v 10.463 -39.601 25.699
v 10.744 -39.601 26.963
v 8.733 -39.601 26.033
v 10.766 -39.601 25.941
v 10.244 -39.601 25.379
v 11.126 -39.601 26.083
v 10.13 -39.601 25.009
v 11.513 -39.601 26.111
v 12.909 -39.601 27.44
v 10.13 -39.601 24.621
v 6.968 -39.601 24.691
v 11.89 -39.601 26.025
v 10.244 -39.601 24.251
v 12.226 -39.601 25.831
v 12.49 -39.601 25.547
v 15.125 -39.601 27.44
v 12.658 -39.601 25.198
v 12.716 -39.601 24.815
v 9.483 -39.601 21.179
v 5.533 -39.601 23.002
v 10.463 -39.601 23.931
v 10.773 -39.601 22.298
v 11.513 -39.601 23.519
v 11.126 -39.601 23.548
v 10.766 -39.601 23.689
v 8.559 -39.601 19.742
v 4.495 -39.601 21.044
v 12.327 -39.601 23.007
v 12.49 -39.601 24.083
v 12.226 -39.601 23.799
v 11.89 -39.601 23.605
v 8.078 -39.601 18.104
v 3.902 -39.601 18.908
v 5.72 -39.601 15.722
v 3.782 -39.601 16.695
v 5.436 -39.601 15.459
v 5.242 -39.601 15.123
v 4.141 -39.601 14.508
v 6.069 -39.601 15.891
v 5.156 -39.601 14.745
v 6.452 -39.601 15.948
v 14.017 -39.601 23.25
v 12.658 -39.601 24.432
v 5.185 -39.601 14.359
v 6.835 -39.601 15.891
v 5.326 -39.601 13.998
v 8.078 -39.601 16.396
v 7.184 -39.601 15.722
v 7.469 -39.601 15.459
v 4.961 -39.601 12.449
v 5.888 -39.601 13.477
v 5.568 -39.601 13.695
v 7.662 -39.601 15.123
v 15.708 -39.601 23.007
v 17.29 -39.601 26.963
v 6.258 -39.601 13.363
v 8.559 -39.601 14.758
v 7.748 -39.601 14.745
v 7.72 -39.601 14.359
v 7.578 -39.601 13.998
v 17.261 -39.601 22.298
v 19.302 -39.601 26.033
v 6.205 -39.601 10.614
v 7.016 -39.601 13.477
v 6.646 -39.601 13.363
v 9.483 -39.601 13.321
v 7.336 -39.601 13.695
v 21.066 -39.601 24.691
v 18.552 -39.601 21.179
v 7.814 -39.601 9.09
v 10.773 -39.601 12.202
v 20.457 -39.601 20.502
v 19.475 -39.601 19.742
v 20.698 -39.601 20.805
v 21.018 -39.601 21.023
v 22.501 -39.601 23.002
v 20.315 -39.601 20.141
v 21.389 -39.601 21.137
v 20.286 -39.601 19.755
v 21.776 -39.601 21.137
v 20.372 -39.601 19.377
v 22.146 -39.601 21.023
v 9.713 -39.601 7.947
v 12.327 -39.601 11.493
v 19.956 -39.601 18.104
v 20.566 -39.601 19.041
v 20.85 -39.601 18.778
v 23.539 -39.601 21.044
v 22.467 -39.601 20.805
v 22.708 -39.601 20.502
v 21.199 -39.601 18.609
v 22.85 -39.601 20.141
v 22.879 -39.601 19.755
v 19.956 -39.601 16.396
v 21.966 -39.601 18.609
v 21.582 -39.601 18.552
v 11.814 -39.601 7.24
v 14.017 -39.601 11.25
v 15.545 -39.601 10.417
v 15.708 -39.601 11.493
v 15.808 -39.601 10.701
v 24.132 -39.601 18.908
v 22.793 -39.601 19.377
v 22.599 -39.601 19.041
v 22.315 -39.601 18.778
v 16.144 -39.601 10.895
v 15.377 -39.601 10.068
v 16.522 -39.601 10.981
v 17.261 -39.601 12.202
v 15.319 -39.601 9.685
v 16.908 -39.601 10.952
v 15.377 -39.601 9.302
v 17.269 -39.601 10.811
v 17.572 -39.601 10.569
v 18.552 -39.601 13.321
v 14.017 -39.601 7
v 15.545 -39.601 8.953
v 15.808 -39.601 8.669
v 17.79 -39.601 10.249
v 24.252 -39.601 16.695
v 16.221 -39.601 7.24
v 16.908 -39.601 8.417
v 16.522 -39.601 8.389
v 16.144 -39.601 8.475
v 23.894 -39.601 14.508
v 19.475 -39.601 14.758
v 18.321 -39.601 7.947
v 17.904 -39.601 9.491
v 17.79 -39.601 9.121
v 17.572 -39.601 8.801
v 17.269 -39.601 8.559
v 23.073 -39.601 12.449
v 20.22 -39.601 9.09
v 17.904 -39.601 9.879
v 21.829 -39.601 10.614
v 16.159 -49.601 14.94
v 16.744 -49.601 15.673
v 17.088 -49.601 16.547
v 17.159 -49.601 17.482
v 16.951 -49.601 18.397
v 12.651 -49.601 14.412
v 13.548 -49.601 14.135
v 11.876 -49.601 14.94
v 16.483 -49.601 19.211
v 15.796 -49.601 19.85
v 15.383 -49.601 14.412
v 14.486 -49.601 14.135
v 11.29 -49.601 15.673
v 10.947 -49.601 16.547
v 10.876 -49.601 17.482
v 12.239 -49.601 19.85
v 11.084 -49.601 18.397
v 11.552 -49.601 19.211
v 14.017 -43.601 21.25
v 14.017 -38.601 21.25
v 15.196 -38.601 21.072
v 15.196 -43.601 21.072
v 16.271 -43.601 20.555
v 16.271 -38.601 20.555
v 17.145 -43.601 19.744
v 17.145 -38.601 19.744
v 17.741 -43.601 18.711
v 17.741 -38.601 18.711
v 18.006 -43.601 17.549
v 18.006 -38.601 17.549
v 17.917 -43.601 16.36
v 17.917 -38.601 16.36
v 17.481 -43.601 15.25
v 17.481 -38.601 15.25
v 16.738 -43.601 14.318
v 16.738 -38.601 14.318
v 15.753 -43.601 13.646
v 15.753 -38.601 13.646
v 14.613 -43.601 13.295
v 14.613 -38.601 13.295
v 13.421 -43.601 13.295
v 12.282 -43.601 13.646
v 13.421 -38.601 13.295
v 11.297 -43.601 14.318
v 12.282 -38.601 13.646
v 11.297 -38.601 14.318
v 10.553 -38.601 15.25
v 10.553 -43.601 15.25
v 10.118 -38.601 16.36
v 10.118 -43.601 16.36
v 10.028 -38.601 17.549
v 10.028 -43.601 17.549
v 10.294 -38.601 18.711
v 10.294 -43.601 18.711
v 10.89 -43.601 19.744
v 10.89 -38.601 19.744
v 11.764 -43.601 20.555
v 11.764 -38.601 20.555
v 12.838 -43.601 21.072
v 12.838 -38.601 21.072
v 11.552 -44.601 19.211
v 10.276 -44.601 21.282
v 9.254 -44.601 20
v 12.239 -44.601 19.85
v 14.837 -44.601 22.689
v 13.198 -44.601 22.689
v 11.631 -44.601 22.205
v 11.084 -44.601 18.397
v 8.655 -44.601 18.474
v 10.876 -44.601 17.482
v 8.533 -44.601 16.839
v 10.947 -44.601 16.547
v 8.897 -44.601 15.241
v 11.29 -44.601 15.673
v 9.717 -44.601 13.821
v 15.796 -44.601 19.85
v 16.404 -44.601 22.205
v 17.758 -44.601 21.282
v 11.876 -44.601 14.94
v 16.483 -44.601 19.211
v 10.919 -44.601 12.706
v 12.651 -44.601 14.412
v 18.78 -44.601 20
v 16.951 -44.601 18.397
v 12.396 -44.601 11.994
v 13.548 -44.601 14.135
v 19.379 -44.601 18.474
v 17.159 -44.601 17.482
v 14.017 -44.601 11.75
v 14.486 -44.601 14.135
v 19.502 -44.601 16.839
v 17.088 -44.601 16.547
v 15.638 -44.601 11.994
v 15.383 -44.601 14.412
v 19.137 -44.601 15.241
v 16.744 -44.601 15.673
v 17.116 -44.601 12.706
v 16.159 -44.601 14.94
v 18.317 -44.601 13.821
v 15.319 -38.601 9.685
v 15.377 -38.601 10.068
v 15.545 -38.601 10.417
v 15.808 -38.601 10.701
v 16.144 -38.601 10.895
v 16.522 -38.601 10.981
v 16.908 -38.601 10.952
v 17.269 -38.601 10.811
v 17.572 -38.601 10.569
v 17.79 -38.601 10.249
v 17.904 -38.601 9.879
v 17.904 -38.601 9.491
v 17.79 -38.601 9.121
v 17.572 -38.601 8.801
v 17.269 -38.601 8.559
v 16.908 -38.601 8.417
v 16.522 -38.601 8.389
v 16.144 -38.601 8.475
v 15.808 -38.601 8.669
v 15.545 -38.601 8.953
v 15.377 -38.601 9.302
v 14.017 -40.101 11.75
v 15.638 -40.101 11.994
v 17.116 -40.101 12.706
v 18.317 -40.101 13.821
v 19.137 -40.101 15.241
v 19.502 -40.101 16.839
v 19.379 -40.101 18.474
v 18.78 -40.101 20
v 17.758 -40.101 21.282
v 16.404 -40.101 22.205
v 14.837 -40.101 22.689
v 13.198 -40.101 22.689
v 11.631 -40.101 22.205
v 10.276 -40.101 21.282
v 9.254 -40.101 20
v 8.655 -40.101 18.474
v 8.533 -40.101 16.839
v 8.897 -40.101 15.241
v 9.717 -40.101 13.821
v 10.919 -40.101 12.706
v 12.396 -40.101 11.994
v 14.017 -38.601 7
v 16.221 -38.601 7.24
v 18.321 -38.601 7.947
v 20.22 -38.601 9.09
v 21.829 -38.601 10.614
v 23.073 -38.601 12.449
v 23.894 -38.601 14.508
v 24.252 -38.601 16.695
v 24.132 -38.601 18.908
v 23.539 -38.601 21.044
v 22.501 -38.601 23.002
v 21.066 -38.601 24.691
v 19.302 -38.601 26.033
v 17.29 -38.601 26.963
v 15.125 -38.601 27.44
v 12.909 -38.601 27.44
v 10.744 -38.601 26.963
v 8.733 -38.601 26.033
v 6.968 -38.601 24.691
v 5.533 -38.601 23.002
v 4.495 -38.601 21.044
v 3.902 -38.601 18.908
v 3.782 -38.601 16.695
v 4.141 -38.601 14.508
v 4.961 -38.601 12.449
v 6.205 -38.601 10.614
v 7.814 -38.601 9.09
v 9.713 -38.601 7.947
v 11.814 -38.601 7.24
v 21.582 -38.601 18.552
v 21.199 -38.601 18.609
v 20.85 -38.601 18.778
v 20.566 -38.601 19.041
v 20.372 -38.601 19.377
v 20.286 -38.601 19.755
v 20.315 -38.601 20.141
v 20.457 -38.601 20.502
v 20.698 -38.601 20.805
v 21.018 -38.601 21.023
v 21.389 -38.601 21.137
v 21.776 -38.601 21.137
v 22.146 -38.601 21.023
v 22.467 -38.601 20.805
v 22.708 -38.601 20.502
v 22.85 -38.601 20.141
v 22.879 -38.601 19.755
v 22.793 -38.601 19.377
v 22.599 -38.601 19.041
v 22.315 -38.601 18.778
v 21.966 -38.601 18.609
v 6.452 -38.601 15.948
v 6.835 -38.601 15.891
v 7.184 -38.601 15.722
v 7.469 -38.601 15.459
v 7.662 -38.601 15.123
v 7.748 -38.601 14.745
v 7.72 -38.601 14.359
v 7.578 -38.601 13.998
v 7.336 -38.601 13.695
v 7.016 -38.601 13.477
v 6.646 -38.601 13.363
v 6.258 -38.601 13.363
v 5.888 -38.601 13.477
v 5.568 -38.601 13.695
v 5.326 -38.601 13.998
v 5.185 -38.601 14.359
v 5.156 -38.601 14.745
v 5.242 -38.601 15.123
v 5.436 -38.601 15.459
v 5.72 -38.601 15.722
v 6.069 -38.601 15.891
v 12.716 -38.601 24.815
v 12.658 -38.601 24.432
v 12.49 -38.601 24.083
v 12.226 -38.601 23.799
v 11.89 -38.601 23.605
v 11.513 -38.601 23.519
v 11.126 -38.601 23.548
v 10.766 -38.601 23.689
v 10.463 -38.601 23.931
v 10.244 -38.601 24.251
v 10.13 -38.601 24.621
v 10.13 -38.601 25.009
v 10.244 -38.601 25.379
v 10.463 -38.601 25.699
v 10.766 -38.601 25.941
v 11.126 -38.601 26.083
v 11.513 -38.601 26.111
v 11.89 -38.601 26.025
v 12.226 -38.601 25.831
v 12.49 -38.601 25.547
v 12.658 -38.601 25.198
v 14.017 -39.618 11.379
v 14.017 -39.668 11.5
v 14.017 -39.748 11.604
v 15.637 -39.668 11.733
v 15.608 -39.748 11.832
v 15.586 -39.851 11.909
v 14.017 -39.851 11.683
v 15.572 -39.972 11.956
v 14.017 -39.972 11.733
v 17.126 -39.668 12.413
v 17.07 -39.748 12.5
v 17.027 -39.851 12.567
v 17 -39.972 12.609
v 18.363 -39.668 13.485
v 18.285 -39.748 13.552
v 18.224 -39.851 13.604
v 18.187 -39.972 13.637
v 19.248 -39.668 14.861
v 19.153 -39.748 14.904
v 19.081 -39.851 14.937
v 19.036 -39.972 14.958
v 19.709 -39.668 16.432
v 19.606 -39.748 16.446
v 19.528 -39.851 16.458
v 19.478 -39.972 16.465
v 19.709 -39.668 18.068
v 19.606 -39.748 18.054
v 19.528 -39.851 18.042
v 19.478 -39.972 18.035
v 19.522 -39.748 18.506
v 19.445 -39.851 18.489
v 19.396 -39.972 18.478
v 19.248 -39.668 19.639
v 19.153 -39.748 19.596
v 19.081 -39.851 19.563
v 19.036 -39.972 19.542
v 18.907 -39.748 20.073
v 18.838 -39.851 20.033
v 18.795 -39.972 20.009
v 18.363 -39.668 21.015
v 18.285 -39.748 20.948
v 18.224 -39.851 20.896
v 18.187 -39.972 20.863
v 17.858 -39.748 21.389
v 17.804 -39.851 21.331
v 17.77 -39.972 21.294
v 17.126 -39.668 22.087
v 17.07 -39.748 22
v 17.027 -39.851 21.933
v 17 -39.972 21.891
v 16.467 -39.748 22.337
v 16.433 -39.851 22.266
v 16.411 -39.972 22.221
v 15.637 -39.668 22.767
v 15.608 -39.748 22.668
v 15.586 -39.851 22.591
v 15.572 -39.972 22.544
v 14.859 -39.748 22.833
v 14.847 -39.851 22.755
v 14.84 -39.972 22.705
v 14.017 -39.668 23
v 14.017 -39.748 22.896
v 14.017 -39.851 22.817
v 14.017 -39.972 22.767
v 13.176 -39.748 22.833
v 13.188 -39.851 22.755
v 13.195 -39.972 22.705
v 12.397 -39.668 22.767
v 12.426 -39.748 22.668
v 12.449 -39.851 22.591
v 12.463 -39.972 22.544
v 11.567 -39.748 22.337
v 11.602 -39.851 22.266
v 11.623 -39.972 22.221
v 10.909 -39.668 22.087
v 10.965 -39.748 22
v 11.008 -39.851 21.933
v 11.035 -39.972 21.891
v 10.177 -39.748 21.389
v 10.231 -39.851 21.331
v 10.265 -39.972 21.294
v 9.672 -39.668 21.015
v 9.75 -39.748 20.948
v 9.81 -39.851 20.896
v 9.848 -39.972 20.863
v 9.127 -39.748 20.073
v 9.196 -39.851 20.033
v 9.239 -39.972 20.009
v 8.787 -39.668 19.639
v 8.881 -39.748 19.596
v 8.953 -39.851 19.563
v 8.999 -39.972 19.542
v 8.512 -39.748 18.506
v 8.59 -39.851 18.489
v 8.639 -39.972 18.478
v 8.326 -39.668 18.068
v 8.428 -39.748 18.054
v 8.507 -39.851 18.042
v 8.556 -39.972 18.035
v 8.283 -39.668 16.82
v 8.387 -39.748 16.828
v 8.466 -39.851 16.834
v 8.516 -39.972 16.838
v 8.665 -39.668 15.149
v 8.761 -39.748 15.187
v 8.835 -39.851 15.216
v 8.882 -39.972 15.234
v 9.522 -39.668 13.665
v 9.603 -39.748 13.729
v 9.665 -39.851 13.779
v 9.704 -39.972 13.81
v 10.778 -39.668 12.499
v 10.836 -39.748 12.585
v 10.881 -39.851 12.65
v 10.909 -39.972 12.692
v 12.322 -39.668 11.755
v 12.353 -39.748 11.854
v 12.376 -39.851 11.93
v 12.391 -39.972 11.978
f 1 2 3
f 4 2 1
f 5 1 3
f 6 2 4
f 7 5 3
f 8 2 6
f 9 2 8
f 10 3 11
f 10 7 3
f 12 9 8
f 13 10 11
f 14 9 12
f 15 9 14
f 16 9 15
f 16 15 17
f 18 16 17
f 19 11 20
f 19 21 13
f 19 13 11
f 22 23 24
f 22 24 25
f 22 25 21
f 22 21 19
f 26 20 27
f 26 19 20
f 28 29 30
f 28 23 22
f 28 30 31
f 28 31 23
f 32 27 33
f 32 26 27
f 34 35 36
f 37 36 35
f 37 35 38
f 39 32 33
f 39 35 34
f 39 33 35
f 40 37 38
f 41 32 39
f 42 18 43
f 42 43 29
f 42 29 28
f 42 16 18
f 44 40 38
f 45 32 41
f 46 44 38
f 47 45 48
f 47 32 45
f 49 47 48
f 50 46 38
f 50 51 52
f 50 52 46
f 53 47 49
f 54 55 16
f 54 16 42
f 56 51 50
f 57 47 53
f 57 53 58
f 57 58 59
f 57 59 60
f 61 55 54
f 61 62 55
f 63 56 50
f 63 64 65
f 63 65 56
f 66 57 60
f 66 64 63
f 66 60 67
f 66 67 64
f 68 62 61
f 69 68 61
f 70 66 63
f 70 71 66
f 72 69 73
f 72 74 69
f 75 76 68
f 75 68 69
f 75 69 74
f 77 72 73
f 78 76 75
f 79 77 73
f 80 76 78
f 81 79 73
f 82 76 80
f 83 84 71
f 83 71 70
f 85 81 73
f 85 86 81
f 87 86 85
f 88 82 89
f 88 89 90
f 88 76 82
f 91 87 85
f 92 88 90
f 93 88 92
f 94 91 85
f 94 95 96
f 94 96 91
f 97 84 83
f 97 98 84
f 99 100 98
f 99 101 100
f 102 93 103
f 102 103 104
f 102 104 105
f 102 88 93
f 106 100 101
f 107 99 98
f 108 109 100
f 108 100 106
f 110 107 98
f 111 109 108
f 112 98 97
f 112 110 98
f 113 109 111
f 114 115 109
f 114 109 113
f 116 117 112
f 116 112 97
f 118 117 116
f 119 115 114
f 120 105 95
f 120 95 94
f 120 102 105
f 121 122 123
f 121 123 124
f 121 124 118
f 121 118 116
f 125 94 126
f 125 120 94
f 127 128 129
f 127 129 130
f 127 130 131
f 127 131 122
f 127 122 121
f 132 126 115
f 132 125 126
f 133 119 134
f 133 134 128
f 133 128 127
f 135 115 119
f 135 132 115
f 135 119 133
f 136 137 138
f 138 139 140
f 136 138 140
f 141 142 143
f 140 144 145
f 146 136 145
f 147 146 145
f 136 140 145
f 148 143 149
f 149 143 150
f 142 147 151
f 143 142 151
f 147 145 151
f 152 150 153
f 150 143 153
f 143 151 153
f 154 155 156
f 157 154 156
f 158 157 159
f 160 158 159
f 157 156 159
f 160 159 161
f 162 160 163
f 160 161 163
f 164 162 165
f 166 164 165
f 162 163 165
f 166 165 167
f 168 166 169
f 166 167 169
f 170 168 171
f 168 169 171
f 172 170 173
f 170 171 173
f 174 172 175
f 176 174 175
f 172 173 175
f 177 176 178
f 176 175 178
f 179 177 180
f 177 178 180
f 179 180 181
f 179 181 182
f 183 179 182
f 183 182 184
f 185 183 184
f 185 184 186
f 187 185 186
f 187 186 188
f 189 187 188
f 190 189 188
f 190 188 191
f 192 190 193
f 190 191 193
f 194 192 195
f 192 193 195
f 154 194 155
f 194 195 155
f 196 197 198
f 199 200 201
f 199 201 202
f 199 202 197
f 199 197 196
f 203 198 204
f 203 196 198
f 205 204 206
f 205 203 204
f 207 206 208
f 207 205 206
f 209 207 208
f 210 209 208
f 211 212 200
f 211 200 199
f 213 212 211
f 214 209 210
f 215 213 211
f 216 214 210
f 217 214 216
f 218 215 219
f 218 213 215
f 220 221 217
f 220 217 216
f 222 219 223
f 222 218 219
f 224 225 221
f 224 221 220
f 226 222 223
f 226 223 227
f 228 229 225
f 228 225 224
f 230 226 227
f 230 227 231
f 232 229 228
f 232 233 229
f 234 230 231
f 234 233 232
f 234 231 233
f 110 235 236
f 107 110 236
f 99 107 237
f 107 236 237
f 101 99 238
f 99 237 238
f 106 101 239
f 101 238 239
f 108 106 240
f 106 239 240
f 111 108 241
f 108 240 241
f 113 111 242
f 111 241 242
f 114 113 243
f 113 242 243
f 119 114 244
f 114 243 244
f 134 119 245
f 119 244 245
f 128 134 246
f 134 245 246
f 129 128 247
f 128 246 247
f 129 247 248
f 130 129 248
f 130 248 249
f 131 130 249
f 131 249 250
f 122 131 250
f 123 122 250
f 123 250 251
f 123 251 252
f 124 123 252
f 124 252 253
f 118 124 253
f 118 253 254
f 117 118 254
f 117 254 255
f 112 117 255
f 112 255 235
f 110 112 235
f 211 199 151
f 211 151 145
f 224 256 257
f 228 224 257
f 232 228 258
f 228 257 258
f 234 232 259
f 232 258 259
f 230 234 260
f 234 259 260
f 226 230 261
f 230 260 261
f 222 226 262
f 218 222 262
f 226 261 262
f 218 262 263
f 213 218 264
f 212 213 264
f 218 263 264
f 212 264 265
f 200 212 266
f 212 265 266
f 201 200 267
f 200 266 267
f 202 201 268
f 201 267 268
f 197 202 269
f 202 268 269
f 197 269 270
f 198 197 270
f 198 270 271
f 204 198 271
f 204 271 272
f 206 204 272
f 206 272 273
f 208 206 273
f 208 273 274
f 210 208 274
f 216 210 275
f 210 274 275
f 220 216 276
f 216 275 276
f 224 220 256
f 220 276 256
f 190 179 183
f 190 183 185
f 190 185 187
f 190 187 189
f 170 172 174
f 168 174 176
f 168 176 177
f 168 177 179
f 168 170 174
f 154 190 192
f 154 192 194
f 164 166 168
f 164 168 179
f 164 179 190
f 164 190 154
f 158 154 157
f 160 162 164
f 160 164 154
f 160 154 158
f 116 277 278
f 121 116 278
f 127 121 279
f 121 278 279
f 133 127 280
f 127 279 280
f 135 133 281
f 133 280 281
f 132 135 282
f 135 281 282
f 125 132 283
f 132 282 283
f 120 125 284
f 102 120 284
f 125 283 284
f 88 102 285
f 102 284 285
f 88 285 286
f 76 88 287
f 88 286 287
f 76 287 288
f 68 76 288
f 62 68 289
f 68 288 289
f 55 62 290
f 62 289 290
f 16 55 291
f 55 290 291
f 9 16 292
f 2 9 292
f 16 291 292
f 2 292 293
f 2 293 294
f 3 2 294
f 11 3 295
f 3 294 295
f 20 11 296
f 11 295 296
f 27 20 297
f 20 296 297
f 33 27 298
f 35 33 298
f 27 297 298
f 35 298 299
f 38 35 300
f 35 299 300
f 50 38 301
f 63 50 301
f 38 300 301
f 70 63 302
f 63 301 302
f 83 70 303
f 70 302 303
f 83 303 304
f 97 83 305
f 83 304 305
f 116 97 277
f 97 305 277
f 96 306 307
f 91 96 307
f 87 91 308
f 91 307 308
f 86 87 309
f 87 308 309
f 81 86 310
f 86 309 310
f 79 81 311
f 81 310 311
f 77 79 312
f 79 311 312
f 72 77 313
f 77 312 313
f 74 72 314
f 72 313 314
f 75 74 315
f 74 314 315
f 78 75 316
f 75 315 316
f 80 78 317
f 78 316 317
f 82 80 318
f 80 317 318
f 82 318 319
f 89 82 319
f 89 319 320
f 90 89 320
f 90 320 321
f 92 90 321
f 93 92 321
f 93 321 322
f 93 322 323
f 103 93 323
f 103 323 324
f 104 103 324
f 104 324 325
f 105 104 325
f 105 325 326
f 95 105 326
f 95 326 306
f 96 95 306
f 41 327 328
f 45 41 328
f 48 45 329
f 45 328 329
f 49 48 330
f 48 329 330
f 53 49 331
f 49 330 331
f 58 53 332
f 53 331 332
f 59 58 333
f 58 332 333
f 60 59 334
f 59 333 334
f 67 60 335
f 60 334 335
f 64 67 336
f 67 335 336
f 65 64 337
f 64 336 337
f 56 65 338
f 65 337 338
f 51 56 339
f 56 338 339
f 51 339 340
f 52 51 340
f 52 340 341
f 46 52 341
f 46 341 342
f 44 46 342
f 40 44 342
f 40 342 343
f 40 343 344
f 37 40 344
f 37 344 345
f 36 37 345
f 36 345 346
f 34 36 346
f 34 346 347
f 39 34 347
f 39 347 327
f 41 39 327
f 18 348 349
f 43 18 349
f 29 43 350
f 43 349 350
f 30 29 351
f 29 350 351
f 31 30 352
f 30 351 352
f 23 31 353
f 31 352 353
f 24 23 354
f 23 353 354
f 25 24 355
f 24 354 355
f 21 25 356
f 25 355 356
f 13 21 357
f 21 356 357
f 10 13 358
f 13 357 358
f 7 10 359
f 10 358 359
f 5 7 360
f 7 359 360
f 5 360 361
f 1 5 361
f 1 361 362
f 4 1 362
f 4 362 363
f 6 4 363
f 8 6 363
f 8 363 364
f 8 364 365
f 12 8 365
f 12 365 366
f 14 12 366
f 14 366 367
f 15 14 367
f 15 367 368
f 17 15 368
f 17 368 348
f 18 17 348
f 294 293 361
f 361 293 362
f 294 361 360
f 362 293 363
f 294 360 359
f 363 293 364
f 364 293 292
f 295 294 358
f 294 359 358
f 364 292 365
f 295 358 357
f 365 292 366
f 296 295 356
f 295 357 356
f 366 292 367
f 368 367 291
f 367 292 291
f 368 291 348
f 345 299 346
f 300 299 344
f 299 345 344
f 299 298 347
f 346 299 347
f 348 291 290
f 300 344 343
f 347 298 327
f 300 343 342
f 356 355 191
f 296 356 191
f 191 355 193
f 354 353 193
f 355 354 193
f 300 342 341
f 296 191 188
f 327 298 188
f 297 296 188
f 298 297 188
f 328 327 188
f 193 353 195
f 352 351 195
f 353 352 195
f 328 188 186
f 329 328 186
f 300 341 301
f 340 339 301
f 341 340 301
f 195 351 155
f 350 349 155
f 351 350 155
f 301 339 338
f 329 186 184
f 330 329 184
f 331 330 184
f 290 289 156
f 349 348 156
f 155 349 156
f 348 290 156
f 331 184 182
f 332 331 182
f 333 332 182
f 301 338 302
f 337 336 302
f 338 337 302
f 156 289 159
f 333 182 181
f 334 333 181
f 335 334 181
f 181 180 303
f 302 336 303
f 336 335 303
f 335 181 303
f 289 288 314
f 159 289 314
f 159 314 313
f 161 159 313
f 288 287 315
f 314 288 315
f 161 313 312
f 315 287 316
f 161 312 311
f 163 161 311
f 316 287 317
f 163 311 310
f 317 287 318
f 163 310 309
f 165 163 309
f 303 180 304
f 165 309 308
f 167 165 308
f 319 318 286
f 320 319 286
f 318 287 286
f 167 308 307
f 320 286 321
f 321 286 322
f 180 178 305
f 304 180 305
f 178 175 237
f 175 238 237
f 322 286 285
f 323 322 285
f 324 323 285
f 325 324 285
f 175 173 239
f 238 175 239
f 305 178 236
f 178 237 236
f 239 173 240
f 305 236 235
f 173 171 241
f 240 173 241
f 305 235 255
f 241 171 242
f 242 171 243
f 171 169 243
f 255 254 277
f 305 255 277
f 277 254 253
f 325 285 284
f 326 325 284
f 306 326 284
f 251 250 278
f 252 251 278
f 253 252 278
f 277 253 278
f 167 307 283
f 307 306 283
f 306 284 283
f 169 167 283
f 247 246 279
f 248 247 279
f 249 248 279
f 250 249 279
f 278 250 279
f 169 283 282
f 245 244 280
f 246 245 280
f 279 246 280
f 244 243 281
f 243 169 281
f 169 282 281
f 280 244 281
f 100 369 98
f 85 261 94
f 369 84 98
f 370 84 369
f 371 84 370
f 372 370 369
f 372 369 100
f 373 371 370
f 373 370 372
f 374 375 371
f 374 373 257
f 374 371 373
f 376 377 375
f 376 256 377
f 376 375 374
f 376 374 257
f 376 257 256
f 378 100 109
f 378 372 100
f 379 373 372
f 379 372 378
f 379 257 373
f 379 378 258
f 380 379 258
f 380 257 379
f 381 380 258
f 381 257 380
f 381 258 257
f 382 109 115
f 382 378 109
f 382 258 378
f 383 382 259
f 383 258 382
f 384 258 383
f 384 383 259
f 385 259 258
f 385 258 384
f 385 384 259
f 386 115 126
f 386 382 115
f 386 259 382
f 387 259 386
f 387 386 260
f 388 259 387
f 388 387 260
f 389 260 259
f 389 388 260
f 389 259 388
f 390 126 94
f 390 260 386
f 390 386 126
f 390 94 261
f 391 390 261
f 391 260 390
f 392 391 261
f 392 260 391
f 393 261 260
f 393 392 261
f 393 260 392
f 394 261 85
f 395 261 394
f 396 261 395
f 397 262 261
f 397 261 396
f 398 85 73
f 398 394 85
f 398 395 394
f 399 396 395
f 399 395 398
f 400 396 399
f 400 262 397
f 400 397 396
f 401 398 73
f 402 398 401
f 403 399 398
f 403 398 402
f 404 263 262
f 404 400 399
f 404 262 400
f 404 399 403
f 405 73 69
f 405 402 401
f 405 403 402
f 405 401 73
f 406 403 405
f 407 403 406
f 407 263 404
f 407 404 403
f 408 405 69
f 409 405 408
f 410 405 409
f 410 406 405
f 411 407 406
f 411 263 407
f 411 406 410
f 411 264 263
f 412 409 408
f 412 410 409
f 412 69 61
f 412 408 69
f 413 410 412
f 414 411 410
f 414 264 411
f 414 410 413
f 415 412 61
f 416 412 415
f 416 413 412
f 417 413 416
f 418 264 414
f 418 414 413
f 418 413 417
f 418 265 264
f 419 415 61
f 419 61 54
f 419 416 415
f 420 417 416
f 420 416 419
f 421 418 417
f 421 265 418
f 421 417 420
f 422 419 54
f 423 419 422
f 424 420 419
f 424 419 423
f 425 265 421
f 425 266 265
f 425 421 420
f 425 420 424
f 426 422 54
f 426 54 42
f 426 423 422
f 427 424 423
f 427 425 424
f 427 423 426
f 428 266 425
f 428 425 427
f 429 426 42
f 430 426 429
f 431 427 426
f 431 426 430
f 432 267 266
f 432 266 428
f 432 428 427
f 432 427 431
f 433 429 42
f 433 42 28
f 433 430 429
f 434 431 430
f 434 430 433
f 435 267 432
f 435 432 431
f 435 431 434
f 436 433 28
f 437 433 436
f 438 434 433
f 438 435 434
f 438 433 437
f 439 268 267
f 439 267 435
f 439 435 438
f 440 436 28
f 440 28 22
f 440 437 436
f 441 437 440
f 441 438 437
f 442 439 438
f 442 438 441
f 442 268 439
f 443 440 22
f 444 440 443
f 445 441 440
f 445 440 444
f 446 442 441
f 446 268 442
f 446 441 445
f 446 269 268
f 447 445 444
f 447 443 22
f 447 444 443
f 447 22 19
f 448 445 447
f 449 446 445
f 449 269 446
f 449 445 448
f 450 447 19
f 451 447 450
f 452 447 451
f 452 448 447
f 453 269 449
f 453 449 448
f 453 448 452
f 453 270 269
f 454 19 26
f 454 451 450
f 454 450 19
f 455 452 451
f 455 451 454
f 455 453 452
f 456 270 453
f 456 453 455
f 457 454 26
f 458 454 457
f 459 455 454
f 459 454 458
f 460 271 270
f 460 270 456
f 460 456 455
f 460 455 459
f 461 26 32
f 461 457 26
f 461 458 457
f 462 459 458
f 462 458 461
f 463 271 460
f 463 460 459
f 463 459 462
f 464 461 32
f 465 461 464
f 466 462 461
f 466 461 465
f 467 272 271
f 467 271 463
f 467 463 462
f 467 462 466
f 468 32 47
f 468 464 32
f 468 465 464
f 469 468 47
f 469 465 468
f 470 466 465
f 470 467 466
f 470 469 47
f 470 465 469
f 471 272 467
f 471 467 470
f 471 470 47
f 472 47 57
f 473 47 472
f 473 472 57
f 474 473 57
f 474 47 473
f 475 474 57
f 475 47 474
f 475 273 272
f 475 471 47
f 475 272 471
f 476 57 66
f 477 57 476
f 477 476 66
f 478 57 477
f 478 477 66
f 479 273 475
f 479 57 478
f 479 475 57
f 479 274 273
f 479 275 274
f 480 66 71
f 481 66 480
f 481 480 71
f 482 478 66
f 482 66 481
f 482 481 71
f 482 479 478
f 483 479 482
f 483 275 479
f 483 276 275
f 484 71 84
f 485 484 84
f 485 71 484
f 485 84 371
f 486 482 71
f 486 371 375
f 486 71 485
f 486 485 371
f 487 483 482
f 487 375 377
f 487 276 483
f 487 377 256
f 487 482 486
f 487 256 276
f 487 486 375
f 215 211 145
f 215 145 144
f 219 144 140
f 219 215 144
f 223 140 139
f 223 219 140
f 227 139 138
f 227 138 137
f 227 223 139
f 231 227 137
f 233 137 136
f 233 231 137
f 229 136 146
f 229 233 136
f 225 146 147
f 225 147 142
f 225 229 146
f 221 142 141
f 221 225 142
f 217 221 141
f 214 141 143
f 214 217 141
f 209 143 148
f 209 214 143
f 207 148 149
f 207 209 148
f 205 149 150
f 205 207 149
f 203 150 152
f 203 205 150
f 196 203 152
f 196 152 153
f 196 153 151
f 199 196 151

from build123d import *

# Parameters (mm, degrees)
ESQUISSE1_R                  = 10.25
BOSS_EXTRU_1_DEPTH           = 1
D_GAGEMENT_M21_D             = 2.6
R_P_TITION_CIRCULAIRE1_COUNT = 4
ESQUISSE9_R                  = 5.5
BOSS_EXTRU_4_DEPTH           = 5
CONG_1_R                     = 0.5
ESQUISSE11_R                 = 4
ENL_V_MAT_EXTRU_2_DEPTH      = 5
BOSS_EXTRU_5_DEPTH           = 5


with BuildPart() as part:
    # Esquisse1 → Boss.-Extru.1 (new body)
    with BuildSketch(Plane.XZ.offset(38.601290575)):
        with Locations(Location((14.017249305, 17.25, 0), (0, 0, 270))):
            Circle(ESQUISSE1_R)
    extrude(amount=BOSS_EXTRU_1_DEPTH)

    # Dégagement M21 (through all)
    with Locations(Plane(origin=(0, -39.601290575, 0), x_dir=(-1, 0, 0), z_dir=(0, -1, 0))):
        with Locations((-11.415520349, -24.815117741)):
            d_gagement_m21 = Hole(D_GAGEMENT_M21_D / 2)

    # Répétition circulaire1: Dégagement M21 ×4 about axis
    r_p_tition_circulaire1_axis = Axis((14.017249305, 0, 17.25), (0, 1, 0))
    for i in range(1, R_P_TITION_CIRCULAIRE1_COUNT):
        add(d_gagement_m21.rotate(r_p_tition_circulaire1_axis, i * 360 / R_P_TITION_CIRCULAIRE1_COUNT), mode=Mode.SUBTRACT)

    # Esquisse9 → Boss.-Extru.4 (add)
    with BuildSketch(Plane(origin=(0, -39.601290575, 0), x_dir=(-1, 0, 0), z_dir=(0, -1, 0))):
        with Locations(Location((-14.017249305, -17.25, 0), (0, 0, 90))):
            Circle(ESQUISSE9_R)
    extrude(amount=BOSS_EXTRU_4_DEPTH)

    # Congé1
    cong_1_edges = [part.edges().sort_by_distance(p)[0] for p in [
        (14.017249305, -39.601290575, 22.75),
    ]]
    fillet(cong_1_edges, radius=CONG_1_R)

    # Esquisse11 → Enlèv. mat.-Extru.2 (cut)
    with BuildSketch(Plane(origin=(0, -38.601290575, 0), x_dir=(1, 0, 0), z_dir=(0, 1, 0))):
        with Locations(Location((14.017249305, -17.25, 0), (0, 0, 270))):
            Circle(ESQUISSE11_R)
    extrude(amount=-ENL_V_MAT_EXTRU_2_DEPTH, mode=Mode.SUBTRACT)

    # Esquisse10 → Boss.-Extru.5 (add)
    with BuildSketch(Plane.XZ.offset(44.601290575)):
        with BuildLine():
            Line((12.238907381, 19.85), (15.79559123, 19.85))
            ThreePointArc((15.79559123, 19.85), (14.017249305, 14.1), (12.238907381, 19.85))
        make_face()
    extrude(amount=BOSS_EXTRU_5_DEPTH)


solid = part.part
